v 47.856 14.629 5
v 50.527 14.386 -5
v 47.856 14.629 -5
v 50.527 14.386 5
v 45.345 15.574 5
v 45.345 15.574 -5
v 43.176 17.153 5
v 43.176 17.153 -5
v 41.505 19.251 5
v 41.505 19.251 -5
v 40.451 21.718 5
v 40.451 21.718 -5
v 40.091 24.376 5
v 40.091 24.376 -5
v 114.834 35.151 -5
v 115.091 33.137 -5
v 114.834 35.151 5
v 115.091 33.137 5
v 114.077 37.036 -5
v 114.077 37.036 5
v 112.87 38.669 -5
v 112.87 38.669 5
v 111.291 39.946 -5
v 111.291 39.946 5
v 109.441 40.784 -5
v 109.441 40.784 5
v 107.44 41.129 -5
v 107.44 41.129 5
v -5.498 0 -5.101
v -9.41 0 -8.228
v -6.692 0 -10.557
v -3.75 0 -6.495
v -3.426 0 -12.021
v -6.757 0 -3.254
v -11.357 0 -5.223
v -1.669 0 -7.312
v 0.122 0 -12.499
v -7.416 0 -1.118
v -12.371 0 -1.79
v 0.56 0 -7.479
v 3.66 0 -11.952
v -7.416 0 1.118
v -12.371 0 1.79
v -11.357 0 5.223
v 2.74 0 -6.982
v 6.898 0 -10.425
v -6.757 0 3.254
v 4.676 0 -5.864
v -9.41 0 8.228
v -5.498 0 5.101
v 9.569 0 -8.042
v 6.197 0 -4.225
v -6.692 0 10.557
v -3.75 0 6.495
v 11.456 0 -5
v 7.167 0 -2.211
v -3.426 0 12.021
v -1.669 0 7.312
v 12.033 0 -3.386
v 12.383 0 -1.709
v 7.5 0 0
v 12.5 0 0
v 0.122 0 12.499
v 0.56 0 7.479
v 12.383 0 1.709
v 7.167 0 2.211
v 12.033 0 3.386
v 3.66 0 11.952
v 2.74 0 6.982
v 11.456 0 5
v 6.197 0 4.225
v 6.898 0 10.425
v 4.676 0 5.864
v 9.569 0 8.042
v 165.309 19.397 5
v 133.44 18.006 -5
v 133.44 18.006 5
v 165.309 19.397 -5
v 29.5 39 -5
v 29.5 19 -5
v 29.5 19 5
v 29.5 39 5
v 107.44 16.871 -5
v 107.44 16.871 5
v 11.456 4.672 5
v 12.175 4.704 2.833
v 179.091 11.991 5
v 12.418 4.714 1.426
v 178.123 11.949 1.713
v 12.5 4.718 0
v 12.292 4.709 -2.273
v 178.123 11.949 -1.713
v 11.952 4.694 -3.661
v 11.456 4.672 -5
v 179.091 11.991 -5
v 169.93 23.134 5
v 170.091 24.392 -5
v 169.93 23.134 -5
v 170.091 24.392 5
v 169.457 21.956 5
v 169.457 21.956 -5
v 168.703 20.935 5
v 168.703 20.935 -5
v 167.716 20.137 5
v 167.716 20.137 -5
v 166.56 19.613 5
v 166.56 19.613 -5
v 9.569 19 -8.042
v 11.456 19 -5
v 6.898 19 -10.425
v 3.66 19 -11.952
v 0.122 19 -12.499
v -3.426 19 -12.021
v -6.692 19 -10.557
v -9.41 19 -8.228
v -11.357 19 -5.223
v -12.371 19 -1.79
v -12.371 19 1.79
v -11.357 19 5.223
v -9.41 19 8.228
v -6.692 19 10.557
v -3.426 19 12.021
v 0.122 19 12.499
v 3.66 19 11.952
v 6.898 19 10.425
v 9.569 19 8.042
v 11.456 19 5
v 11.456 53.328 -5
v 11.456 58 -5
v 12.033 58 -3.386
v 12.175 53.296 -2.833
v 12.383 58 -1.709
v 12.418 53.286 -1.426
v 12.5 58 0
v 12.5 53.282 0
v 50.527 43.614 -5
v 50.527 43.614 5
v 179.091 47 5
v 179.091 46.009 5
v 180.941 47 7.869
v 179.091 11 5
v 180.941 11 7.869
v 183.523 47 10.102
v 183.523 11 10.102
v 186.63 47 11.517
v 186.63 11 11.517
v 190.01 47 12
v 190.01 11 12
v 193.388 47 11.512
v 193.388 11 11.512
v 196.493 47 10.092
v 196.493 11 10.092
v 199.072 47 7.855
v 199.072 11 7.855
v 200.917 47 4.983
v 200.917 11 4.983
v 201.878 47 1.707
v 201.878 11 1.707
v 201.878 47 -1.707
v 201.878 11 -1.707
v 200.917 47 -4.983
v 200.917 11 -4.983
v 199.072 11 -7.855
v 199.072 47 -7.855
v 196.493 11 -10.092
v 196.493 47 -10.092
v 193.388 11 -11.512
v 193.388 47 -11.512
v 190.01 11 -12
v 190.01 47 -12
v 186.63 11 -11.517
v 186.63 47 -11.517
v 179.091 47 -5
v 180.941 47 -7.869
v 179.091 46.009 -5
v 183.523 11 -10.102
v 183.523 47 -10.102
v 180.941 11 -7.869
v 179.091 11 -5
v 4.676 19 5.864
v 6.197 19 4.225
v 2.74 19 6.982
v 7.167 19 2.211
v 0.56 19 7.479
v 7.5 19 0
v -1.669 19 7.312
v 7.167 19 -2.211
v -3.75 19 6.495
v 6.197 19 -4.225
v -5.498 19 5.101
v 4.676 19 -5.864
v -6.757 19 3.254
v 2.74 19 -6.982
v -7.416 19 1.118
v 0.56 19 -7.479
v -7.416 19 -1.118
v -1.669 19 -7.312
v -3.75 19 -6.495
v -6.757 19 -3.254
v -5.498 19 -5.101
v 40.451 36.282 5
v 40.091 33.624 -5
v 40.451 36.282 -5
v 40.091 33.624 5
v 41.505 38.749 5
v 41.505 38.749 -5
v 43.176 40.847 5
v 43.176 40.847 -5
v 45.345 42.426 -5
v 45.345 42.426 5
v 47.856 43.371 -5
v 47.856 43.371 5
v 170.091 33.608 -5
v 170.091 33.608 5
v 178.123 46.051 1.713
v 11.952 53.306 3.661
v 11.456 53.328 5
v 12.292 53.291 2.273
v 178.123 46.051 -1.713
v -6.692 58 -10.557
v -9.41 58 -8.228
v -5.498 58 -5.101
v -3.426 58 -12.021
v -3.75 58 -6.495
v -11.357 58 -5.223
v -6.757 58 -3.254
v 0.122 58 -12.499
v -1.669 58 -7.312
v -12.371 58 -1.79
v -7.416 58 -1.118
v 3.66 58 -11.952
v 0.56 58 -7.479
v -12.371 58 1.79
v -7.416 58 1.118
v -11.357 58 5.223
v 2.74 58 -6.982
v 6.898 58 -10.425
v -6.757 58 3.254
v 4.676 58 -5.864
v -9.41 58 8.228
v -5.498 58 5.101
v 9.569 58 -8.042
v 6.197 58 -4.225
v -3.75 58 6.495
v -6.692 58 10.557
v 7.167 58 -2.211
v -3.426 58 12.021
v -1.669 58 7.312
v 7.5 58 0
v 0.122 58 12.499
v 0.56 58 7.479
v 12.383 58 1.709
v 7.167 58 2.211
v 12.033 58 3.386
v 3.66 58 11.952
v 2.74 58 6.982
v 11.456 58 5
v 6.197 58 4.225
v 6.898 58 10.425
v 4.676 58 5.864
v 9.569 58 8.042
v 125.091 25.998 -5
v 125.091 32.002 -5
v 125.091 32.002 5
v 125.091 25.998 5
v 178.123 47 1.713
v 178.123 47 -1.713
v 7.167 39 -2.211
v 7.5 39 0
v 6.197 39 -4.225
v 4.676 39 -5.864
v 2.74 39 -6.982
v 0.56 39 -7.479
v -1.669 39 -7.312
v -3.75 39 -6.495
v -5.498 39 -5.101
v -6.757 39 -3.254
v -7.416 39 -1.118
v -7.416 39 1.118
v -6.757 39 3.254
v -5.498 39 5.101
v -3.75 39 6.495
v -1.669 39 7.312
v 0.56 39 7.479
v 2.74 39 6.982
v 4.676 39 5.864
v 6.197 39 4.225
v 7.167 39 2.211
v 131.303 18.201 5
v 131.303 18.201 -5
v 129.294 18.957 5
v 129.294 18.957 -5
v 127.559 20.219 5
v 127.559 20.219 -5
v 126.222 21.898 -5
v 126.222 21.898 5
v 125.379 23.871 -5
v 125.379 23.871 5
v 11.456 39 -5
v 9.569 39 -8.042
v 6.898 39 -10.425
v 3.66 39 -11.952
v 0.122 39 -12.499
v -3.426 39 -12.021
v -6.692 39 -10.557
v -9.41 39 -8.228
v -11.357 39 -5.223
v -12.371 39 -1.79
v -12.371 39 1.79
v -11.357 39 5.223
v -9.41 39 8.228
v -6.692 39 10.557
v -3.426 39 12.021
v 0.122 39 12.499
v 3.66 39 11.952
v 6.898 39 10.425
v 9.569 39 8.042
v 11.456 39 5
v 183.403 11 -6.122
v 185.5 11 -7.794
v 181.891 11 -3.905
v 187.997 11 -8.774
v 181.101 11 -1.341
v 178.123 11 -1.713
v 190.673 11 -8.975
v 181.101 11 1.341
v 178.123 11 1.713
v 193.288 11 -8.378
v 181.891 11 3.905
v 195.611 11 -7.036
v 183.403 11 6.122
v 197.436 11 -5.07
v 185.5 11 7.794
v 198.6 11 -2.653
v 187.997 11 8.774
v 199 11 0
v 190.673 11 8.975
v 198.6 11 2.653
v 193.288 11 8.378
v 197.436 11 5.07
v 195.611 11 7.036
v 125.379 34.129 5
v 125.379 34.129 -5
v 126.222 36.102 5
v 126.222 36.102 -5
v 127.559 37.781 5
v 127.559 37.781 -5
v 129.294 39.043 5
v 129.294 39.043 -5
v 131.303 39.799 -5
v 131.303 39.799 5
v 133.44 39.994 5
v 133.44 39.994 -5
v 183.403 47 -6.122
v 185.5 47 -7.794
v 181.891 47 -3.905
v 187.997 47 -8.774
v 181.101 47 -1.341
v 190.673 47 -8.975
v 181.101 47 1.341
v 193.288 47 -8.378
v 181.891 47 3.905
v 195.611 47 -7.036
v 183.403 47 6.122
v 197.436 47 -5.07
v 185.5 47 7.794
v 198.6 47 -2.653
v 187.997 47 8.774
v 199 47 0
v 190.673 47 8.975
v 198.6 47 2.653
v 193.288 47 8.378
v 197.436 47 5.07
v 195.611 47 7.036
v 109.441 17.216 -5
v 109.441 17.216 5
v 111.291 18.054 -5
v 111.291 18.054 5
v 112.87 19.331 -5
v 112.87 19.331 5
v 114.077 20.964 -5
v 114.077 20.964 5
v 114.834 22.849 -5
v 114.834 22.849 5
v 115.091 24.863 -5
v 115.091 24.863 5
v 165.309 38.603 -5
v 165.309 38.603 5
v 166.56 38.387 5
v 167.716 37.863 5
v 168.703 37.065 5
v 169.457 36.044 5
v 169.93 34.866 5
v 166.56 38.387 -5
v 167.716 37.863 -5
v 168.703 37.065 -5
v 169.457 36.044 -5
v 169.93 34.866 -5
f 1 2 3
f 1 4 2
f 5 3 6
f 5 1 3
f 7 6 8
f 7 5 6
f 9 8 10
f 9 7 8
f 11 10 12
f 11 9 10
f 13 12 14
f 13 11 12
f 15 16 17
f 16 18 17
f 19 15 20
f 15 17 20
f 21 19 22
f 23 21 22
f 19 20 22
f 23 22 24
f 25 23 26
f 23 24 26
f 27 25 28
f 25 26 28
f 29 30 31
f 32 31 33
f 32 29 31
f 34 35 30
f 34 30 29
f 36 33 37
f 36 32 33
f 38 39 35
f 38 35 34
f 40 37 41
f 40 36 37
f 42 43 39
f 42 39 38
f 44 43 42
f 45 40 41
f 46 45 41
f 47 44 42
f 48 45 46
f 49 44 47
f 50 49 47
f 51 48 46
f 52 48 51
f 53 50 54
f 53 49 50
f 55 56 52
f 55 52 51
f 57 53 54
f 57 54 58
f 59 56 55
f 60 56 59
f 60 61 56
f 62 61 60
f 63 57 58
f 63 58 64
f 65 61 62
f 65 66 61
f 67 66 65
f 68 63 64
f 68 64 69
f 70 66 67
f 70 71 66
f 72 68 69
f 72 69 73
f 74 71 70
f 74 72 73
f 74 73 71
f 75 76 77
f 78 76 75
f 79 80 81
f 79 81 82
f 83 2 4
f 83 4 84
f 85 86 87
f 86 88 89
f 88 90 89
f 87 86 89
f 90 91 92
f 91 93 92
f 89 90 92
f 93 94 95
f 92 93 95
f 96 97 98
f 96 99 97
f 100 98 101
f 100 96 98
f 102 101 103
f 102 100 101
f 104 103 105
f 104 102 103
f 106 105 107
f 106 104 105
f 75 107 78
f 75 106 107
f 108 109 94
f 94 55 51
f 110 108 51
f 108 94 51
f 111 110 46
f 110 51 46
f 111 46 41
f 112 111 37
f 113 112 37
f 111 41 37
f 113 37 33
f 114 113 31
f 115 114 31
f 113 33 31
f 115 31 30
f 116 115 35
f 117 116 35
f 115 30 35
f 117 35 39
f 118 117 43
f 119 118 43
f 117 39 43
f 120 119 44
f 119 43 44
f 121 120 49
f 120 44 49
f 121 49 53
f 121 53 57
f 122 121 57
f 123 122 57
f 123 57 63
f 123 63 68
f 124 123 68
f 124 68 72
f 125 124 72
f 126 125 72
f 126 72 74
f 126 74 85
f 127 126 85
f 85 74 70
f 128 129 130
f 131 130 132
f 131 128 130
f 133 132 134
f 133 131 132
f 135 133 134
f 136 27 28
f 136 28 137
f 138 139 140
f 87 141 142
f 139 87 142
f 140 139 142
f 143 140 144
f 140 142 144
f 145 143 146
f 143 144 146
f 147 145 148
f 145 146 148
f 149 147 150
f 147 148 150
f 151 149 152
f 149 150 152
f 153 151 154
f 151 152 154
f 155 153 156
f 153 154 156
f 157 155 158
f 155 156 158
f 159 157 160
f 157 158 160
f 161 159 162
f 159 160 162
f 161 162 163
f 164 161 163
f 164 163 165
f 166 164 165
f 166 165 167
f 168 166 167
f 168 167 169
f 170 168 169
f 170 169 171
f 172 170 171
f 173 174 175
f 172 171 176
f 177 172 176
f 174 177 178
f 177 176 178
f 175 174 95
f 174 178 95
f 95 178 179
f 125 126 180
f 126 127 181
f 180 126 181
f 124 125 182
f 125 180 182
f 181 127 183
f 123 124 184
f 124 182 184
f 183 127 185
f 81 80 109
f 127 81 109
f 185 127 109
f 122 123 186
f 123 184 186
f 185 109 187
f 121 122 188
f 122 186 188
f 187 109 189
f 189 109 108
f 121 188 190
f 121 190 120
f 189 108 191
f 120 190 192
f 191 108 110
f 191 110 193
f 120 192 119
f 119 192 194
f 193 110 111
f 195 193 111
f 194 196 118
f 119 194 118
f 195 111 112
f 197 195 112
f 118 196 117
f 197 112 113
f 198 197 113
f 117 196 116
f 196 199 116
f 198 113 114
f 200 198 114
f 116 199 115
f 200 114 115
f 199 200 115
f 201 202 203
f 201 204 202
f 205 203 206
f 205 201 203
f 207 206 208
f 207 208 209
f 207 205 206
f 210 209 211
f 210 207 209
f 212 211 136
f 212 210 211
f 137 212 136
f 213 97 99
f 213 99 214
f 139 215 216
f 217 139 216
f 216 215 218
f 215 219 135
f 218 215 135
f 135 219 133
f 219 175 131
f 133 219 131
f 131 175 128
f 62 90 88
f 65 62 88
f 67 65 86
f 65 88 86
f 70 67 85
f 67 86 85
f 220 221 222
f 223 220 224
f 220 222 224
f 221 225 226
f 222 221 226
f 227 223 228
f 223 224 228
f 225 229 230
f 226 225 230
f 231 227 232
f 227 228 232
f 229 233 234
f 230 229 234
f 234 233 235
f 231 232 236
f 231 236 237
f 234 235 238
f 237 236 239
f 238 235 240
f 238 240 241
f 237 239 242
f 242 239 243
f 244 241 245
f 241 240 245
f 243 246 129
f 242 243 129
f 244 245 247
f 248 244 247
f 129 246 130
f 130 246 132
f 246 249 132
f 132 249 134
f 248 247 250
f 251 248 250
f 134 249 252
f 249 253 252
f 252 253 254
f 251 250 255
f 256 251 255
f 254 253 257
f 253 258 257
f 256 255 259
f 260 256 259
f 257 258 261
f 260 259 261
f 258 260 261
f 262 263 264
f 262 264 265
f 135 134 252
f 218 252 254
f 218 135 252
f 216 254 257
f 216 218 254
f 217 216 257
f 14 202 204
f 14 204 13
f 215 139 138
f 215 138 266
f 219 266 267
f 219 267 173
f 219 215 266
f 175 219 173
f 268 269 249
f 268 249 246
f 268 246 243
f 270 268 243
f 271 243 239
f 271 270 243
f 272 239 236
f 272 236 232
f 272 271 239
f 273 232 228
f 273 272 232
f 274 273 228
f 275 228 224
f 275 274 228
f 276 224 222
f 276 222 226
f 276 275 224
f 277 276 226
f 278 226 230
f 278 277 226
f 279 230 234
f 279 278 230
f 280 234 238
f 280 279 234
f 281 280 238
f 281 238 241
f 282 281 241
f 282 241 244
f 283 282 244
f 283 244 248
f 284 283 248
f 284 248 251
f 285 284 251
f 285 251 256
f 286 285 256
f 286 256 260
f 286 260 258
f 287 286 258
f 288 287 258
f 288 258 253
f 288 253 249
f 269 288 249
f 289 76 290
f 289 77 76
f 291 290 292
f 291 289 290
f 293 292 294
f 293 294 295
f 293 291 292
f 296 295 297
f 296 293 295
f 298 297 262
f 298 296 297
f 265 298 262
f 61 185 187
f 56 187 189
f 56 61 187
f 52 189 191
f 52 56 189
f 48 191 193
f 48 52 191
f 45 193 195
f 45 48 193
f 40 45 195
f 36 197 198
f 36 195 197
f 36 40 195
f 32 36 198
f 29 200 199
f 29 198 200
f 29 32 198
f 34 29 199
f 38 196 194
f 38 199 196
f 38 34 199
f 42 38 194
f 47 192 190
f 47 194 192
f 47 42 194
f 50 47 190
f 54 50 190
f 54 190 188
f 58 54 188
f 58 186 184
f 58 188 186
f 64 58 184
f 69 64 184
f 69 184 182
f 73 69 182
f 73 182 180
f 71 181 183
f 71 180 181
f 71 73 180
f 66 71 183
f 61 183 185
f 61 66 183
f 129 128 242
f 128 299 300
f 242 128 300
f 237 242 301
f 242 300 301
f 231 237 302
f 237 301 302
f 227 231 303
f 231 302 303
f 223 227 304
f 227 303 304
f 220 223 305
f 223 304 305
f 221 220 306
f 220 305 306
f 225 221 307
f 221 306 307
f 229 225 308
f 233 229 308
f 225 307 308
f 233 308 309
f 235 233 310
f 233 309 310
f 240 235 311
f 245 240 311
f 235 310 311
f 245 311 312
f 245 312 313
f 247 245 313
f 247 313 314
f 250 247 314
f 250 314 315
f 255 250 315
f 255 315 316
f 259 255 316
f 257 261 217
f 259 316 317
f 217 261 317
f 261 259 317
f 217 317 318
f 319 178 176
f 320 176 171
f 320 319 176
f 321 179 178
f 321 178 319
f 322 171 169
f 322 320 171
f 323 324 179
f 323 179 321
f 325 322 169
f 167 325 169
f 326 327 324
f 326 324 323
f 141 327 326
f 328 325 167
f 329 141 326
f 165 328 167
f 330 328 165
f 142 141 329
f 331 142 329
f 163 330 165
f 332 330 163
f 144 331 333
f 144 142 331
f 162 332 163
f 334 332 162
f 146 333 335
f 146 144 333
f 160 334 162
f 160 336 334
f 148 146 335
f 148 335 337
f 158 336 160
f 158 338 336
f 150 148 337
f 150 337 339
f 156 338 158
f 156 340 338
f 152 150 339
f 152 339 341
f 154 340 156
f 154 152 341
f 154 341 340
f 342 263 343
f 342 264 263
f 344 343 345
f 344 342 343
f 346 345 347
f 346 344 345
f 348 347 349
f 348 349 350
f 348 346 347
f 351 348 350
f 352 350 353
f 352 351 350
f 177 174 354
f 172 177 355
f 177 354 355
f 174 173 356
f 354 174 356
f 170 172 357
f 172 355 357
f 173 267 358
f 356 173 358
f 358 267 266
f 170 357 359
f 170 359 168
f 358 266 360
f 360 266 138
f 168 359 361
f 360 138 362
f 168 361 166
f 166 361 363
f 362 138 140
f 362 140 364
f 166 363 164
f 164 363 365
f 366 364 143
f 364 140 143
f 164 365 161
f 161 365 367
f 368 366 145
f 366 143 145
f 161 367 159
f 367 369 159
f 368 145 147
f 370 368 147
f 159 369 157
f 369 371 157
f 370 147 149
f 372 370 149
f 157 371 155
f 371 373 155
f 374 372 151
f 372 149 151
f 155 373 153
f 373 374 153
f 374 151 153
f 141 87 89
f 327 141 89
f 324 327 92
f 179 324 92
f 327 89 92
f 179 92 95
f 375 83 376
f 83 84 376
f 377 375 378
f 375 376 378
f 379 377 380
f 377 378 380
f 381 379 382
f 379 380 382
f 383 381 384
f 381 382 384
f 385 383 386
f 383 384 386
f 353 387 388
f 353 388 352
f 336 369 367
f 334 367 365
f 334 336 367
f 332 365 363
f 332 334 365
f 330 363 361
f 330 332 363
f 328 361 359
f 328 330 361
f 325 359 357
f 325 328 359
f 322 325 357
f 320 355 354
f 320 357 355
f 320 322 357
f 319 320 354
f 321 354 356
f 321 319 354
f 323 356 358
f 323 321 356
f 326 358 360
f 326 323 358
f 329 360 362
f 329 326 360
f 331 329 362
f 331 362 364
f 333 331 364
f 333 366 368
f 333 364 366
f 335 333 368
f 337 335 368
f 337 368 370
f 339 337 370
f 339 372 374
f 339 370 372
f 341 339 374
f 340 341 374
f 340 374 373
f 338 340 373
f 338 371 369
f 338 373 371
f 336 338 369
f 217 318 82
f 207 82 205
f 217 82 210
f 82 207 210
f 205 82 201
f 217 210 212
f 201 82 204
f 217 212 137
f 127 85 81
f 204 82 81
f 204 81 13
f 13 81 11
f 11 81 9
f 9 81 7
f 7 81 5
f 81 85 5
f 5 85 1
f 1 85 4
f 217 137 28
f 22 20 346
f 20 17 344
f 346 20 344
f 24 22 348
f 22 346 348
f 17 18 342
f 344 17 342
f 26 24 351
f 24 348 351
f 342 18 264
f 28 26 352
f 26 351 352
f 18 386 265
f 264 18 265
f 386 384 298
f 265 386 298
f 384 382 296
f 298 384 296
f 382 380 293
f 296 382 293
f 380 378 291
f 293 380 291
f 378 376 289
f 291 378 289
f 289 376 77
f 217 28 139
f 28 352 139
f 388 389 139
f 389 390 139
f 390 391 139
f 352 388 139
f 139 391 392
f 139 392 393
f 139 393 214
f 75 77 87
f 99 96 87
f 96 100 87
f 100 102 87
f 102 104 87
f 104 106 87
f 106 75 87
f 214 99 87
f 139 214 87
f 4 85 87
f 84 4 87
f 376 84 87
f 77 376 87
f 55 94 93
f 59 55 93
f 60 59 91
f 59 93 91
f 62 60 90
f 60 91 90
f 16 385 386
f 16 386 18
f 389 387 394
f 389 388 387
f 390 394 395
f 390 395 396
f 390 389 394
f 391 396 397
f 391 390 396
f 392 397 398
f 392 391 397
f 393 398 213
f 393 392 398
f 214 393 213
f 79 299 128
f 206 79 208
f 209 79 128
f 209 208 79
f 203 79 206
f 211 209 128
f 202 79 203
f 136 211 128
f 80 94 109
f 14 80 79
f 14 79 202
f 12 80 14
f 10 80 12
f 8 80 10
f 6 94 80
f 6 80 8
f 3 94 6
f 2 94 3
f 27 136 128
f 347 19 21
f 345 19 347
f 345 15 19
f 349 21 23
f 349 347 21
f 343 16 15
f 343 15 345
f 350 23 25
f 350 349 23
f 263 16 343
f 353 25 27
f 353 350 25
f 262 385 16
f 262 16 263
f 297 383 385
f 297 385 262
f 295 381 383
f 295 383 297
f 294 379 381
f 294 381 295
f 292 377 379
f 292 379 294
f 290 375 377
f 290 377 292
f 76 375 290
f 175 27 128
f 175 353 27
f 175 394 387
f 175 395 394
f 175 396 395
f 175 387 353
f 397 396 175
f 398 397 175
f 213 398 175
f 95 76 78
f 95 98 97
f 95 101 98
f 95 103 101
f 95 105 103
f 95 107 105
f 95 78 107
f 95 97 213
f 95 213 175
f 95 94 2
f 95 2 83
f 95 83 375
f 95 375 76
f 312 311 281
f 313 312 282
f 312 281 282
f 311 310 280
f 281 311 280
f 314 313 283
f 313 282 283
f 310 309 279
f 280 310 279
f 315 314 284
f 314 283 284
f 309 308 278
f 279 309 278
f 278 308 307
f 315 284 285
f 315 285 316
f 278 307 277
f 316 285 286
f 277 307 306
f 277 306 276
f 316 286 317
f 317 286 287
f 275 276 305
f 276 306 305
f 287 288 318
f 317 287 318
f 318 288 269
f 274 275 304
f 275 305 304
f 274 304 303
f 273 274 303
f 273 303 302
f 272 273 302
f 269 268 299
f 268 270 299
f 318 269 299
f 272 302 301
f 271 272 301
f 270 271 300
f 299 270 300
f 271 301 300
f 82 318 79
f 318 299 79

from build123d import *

# Parameters (mm, degrees)
SKETCH1_R               = 12.5
SKETCH1_R_2             = 7.5
SKETCH1_R_3             = 12
SKETCH1_R_4             = 9
SKETCH1_W               = 167.634848648
SKETCH1_H               = 10
BOSS_EXTRUDE1_DEPTH     = 58
SKETCH2_W               = 22.908712115
SKETCH2_H               = 11
SKETCH2_W_2             = 18.043560763
SKETCH2_H_2             = 20
SKETCH2_W_3             = 23.956439237
CUT_EXTRUDE1_DEPTH      = 8.5
CUT_EXTRUDE1_DEPTH_BACK = 18.5
BOSS_EXTRUDE2_START     = -0.99133
BOSS_EXTRUDE2_DEPTH     = 0.99133
BOSS_EXTRUDE3_START     = -4.717797
BOSS_EXTRUDE3_DEPTH     = 4.717797
FILLET1_R               = 5
FILLET2_R               = 8
FILLET3_R               = 10


with BuildPart() as part:
    # Sketch1 → Boss-Extrude1 (new body)
    with BuildSketch(Plane(origin=(0, 0, 0), x_dir=(1, 0, 0), z_dir=(0, 1, 0))):
        Circle(SKETCH1_R)
        Circle(SKETCH1_R_2, mode=Mode.SUBTRACT)
        with Locations((190, 0)):
            Circle(SKETCH1_R_3)
        with Locations((190, 0)):
            Circle(SKETCH1_R_4, mode=Mode.SUBTRACT)
        with Locations((95.273863561, 0)):
            Rectangle(SKETCH1_W, SKETCH1_H)
    extrude(amount=BOSS_EXTRUDE1_DEPTH)

    # Sketch2 → Cut-Extrude1 (cut, two sides)
    with BuildSketch(Plane(origin=(0, 0, -5), x_dir=(-1, 0, 0), z_dir=(0, 0, -1))) as cut_extrude1_sk:
        with Locations((-190.545643943, 52.5)):
            Rectangle(SKETCH2_W, SKETCH2_H)
        Polygon((-179.091287885, 47), (-179.091287885, 46.00867027), (-11.456439237, 53.327765826), (-11.456439237, 58), (-179.091287885, 58), align=None)
        with Locations((-190.545643943, 5.5)):
            Rectangle(SKETCH2_W, SKETCH2_H)
        Polygon((-179.091287885, 11.99132973), (-179.091287885, 11), (-179.091287885, 0), (-11.456439237, 0), (-11.456439237, 4.672234174), align=None)
        Polygon((-170.091287885, 19.606002726), (-170.091287885, 38.393997274), (-125.091287885, 40.358739705), (-125.091287885, 17.641260295), align=None)
        Polygon((-115.091287885, 17.204650866), (-115.091287885, 40.795349134), (-40.091287885, 44.069919853), (-40.091287885, 13.930080147), align=None)
        with Locations((-20.478219619, 29)):
            Rectangle(SKETCH2_W_2, SKETCH2_H_2)
        with Locations((0.521780381, 29)):
            Rectangle(SKETCH2_W_3, SKETCH2_H_2)
    extrude(amount=CUT_EXTRUDE1_DEPTH, mode=Mode.SUBTRACT)
    extrude(cut_extrude1_sk.sketch, amount=-CUT_EXTRUDE1_DEPTH_BACK, mode=Mode.SUBTRACT)

    # Sketch3 → Boss-Extrude2 (add)
    with BuildSketch(Plane.XZ.offset(-11).offset(BOSS_EXTRUDE2_START)):
        with BuildLine():
            Line((179.091287885, -5), (179.091287885, 5))
            ThreePointArc((179.091287885, 5), (178, 0), (179.091287885, -5))
        make_face()
    boss_extrude2 = extrude(amount=BOSS_EXTRUDE2_DEPTH)

    # Sketch4 → Boss-Extrude3 (add)
    with BuildSketch(Plane.XZ.offset(BOSS_EXTRUDE3_START)):
        with BuildLine():
            Line((11.456439237, 5), (11.456439237, -5))
            ThreePointArc((11.456439237, -5), (12.236328912, -2.553870546), (12.5, 0))
            ThreePointArc((12.5, 0), (12.236328912, 2.553870546), (11.456439237, 5))
        make_face()
    boss_extrude3 = extrude(amount=BOSS_EXTRUDE3_DEPTH)

    # Mirror1: Boss-Extrude2, Boss-Extrude3 across plane
    add(boss_extrude2.mirror(Plane(origin=(0, 29, 0), x_dir=(0, 0, 1), z_dir=(0, -1, 0))))
    add(boss_extrude3.mirror(Plane(origin=(0, 29, 0), x_dir=(0, 0, 1), z_dir=(0, -1, 0))))

    # Fillet1
    fillet1_edges = [part.edges().sort_by_distance(p)[0] for p in [
        (170.091287885, 19.606002726, 0),
        (170.091287885, 38.393997274, 0),
    ]]
    fillet(fillet1_edges, radius=FILLET1_R)

    # Fillet2
    fillet2_edges = [part.edges().sort_by_distance(p)[0] for p in [
        (115.091287885, 17.204650866, 0),
        (115.091287885, 40.795349134, 0),
        (125.091287885, 40.358739705, 0),
        (125.091287885, 17.641260295, 0),
    ]]
    fillet(fillet2_edges, radius=FILLET2_R)

    # Fillet3
    fillet3_edges = [part.edges().sort_by_distance(p)[0] for p in [
        (40.091287885, 44.069919853, 0),
        (40.091287885, 13.930080147, 0),
    ]]
    fillet(fillet3_edges, radius=FILLET3_R)


solid = part.part
